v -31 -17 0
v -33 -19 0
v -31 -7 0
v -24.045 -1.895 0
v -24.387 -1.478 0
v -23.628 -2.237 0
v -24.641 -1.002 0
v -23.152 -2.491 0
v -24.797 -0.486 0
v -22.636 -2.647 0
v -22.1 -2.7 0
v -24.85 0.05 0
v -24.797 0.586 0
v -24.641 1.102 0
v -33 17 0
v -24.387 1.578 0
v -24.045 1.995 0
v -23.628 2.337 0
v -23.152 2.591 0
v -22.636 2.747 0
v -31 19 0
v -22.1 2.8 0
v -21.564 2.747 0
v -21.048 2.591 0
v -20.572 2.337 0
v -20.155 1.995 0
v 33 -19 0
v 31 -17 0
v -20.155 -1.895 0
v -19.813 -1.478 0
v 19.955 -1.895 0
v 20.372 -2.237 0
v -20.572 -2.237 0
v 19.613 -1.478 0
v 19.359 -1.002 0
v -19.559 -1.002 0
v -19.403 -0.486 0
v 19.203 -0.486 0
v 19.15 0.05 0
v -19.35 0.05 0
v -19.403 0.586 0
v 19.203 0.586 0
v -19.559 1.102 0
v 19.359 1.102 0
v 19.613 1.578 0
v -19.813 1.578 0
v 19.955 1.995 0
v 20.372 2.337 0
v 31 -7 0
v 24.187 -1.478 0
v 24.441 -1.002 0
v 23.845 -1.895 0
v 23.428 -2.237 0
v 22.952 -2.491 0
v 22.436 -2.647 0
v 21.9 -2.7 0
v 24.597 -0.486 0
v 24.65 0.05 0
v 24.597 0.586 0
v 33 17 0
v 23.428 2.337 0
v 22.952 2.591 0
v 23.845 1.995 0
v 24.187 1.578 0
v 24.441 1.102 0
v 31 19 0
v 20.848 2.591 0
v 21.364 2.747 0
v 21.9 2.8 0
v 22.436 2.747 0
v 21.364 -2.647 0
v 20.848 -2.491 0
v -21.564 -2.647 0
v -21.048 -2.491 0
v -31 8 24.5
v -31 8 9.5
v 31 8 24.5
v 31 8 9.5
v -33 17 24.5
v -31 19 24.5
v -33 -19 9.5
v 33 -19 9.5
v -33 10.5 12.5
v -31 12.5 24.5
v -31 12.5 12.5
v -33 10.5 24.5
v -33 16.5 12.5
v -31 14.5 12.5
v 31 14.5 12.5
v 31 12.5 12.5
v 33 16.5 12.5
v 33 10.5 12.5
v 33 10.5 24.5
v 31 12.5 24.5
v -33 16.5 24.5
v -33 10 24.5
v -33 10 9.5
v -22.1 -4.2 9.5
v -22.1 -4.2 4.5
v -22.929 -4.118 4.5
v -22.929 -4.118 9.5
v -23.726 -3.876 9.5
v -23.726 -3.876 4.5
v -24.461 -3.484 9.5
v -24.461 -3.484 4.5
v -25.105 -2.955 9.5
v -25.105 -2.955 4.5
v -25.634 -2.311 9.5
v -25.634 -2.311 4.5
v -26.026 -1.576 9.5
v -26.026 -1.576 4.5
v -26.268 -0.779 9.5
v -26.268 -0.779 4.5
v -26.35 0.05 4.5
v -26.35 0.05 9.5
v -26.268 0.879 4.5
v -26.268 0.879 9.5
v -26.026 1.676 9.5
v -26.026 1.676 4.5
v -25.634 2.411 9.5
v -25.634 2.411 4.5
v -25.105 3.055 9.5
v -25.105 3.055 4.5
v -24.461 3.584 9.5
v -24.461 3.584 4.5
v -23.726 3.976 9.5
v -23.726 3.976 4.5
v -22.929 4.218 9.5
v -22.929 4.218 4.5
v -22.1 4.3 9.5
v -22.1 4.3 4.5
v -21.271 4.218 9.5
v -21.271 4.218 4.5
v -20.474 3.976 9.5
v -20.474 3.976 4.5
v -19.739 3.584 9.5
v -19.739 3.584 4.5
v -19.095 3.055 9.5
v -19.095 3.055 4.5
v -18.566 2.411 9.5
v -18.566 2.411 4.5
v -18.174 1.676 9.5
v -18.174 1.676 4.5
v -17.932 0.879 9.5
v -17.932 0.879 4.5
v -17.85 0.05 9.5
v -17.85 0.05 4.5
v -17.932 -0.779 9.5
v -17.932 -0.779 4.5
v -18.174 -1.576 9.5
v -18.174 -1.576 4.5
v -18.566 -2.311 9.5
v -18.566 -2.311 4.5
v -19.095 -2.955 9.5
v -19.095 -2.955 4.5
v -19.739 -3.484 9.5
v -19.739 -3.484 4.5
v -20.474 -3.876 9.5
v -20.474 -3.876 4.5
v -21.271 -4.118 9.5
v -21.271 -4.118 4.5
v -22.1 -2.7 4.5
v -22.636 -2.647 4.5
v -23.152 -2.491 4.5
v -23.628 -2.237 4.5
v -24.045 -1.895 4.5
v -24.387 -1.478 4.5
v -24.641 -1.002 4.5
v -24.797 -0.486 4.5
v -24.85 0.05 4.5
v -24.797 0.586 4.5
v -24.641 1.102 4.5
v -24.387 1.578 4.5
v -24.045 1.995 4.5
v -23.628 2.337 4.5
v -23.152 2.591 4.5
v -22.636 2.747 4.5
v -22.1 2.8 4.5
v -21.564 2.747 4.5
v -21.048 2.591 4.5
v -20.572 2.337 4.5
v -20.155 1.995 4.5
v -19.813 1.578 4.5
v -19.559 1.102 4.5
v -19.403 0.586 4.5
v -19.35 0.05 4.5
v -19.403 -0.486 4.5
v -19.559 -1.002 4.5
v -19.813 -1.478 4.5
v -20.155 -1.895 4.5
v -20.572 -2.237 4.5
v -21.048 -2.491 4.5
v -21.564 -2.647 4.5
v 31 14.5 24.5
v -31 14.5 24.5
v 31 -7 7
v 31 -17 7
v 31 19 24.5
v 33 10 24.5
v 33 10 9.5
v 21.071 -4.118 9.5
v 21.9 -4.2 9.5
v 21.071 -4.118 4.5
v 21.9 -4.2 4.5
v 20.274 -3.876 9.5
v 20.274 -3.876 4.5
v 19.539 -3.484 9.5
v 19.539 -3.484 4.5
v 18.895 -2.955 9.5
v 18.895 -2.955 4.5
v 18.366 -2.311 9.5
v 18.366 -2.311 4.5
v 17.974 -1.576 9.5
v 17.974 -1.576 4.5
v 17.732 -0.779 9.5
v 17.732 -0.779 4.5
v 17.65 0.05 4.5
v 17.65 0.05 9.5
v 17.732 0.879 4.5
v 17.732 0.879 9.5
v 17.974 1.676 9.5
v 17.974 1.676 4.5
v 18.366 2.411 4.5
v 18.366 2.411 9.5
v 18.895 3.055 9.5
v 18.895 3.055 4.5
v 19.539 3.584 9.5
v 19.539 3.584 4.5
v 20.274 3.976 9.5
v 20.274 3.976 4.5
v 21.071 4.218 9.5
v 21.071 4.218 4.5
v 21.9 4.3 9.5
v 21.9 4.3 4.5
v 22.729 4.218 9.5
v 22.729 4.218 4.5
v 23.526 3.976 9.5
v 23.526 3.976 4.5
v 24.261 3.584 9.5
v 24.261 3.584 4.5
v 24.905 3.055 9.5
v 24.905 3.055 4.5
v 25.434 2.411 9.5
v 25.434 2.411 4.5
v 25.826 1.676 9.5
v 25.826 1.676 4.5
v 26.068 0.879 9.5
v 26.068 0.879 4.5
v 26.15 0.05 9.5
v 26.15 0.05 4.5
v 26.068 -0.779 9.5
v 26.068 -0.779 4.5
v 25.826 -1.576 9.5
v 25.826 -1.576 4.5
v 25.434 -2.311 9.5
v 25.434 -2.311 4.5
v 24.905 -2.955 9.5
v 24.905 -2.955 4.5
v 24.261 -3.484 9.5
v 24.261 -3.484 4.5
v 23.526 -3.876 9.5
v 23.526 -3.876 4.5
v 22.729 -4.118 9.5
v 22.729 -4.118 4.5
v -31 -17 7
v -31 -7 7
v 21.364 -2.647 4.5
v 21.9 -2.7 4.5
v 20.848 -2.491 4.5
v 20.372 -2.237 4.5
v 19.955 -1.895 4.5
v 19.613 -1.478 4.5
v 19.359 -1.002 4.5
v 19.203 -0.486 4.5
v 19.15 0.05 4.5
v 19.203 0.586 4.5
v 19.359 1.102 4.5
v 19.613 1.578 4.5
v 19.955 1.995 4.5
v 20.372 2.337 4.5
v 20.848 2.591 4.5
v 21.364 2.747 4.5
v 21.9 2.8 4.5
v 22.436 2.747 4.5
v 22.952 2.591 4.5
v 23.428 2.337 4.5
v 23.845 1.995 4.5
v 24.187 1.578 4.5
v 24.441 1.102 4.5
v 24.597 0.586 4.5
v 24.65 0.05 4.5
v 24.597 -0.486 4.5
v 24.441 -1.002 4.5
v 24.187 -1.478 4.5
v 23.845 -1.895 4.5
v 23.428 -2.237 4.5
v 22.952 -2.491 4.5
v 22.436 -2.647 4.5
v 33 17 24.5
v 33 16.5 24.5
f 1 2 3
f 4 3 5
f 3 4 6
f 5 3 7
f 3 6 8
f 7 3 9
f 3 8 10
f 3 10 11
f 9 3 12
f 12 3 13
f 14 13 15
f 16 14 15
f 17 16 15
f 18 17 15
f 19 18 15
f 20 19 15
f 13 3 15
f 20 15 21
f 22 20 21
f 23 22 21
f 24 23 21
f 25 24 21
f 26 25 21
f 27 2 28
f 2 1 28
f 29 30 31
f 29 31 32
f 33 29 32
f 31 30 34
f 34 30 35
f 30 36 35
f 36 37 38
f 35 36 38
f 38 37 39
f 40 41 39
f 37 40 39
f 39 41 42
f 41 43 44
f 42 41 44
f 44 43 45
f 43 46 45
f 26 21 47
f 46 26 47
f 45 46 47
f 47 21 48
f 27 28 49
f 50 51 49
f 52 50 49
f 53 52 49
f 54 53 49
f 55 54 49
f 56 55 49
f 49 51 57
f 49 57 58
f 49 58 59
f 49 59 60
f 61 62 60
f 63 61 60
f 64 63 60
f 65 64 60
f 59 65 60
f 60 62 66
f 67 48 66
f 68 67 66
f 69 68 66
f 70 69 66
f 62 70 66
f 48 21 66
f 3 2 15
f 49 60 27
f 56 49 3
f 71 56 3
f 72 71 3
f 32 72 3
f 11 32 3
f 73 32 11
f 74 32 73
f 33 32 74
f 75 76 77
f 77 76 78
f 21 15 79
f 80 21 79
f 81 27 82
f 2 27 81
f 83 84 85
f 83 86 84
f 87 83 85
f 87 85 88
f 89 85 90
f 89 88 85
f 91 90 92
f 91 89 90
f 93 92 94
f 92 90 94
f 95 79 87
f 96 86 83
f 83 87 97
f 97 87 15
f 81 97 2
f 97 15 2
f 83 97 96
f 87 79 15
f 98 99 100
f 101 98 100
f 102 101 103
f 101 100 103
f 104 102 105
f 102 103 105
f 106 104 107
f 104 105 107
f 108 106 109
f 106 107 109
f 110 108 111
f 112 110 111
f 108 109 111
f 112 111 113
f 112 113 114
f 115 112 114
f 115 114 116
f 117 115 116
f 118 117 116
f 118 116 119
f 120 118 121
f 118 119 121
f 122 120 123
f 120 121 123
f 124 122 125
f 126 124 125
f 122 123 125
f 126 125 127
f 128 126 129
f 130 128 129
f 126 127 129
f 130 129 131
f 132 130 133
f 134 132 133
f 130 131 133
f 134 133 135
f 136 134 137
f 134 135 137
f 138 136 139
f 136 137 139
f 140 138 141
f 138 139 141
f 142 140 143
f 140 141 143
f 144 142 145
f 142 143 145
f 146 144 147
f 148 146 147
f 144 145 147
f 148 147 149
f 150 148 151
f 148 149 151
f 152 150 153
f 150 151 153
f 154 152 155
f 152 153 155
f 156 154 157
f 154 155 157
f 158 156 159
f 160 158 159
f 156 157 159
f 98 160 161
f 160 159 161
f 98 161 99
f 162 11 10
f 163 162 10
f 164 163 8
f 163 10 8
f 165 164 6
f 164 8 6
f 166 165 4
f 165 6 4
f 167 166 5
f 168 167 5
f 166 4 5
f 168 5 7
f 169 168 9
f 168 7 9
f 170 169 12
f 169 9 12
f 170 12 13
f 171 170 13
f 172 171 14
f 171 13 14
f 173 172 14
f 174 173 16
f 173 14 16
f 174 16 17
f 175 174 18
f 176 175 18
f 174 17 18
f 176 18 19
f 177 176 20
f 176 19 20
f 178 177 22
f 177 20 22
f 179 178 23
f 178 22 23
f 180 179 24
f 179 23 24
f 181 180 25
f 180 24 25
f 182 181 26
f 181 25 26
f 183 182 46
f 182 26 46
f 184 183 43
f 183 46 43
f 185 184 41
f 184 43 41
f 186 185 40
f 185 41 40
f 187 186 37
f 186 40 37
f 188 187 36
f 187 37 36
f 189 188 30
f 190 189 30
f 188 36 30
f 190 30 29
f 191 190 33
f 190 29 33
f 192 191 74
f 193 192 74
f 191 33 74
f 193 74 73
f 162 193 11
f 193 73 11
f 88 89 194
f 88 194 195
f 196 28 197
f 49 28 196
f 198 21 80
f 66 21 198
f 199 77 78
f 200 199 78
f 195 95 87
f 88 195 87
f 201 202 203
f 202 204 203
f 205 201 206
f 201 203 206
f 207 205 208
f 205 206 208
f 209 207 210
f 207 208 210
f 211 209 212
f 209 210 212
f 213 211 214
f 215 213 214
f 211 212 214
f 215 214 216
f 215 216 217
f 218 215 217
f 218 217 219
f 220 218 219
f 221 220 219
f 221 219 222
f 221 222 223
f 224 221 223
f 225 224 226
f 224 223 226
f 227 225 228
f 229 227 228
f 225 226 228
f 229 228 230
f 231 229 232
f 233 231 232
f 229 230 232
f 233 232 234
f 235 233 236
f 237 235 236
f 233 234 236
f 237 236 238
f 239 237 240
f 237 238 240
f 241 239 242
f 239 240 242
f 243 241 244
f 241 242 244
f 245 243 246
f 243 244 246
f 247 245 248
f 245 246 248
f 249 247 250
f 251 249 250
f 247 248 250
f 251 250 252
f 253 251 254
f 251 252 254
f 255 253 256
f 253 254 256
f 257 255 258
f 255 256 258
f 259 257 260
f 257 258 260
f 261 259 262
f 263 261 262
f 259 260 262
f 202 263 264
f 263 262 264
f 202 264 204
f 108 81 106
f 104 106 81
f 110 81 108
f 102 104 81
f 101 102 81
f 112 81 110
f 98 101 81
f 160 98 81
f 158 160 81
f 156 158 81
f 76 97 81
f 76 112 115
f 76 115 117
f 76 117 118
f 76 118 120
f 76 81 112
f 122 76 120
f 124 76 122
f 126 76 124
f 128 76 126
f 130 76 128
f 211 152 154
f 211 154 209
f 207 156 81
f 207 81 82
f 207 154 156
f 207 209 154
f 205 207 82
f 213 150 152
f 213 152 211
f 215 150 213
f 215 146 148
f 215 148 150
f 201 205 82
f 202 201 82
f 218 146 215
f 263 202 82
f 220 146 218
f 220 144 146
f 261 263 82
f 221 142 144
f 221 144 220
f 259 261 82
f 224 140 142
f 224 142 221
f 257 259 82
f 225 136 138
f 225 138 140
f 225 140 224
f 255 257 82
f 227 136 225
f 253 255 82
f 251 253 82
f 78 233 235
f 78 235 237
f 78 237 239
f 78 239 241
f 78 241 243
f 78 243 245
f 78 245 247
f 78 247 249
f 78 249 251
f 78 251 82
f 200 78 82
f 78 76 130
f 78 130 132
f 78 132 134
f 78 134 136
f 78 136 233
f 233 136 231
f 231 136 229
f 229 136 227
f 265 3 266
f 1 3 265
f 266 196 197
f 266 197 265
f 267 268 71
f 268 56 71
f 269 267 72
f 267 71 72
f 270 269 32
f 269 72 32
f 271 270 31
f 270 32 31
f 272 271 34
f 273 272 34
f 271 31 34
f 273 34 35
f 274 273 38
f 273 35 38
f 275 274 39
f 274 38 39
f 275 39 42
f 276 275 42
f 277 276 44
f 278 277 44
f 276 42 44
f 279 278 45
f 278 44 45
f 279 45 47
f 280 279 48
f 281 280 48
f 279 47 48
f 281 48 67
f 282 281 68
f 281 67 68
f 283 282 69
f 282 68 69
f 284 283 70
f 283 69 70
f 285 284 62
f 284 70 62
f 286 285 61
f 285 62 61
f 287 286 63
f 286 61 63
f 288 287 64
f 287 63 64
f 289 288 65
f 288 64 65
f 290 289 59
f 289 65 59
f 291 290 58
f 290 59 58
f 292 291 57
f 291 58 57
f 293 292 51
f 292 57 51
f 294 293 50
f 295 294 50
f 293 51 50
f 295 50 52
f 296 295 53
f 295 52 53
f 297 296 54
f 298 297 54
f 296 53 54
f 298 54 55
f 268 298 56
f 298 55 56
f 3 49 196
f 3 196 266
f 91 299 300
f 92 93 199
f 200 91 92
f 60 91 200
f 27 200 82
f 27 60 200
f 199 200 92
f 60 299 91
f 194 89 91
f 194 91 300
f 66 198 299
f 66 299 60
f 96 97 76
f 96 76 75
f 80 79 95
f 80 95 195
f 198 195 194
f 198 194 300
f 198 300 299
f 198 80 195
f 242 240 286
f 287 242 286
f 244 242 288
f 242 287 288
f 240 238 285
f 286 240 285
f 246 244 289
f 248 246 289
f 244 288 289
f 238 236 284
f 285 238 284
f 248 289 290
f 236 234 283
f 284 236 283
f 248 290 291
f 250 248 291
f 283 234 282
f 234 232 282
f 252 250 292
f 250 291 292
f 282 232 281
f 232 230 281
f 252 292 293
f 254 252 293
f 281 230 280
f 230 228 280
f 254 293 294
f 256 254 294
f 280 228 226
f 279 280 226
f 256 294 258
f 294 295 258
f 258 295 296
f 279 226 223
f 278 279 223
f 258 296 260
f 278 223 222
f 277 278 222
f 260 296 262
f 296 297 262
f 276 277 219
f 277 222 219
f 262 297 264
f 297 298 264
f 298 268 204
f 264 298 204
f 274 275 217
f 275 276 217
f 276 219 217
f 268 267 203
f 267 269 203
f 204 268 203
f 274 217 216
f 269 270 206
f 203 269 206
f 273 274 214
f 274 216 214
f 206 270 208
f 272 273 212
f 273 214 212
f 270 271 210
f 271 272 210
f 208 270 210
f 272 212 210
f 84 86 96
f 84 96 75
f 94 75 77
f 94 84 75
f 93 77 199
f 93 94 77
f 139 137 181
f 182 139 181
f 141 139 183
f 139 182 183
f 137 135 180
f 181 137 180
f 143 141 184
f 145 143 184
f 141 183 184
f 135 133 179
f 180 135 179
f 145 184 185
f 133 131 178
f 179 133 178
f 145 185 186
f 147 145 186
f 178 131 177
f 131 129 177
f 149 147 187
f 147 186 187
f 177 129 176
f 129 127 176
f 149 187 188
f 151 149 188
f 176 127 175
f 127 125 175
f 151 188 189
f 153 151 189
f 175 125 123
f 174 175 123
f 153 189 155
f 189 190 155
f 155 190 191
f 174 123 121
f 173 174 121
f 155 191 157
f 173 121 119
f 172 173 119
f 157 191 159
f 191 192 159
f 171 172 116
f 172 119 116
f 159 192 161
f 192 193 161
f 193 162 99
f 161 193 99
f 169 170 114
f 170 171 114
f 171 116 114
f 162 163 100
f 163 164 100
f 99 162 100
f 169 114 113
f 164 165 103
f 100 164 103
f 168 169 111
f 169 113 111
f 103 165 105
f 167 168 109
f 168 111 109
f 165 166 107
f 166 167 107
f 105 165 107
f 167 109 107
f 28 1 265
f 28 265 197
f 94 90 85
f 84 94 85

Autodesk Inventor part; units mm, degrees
ref_plane "YZ Plane" through (0, 0, 0) normal (1, 0, 0) x (0, 1, 0)
ref_plane "XZ Plane" through (0, 0, 0) normal (0, 1, 0) x (-1, 0, 0)
ref_plane "XY Plane" through (0, 0, 0) normal (0, 0, 1) x (1, 0, 0)
sketch "Sketch1" plane through (0, 0, 0) normal (0, 0, 1) x (1, 0, 0)
  line L0 (33, -19) -> (-33, -19)
  line L1 (-33, -19) -> (-33, 19)
  line L2 (-33, 19) -> (33, 19)
  line L3 (33, 19) -> (33, -19)
  line L4 (33, -19) -> (-33, 19) construction
  line L5 (-33, -19) -> (33, 19) construction
  point P0 (0, 0)
  dimension "d0" = 66
  dimension "d1" = 38
extrude "Extrusion1" add sketch "Sketch1" along normal blind 9.5
sketch "Sketch2" plane through (0, 0, 0) normal (0, 0, -1) x (-1, 0, 0)
  line L0 (-31, -7) -> (31, -7)
  line L1 (31, -7) -> (31, -17)
  line L2 (31, -17) -> (-31, -17)
  line L3 (-31, -17) -> (-31, -7)
  line L4 (33, 19) -> (33, -19) projected
  line L5 (-33, -19) -> (-33, 19) construction
  line L6 (33, 19) -> (33, -19) construction
  line L7 (33, -19) -> (-33, -19) construction
  point P0 (0, 0)
  point P1 (0, -7)
  dimension "d4" = 2
  dimension "d5" = 2
  dimension "d6" = 12
extrude "Extrusion2" cut sketch "Sketch2" against normal blind 7
sketch "Sketch3" plane through (0, 0, 9.5) normal (0, 0, 1) x (1, 0, 0)
  line L0 (33, -19) -> (33, 19) projected
  line L1 (-33, 19) -> (33, 19) construction
  line L2 (33, 19) -> (33, 8) construction
  line L3 (33, 8) -> (-33, 8) construction
  line L4 (-33, 8) -> (-33, 19) construction
  line L5 (-33, -19) -> (33, -19) projected
  line L6 (-33, 8) -> (33, 8)
  line L7 (33, 8) -> (33, 12.5)
  line L8 (33, 12.5) -> (-33, 12.5)
  line L9 (-33, 12.5) -> (-33, 8)
  line L10 (33, 19) -> (-33, 19) projected
  line L11 (-33, 19) -> (33, 19)
  line L12 (33, 19) -> (33, 14.5)
  line L13 (33, 14.5) -> (-33, 14.5)
  line L14 (-33, 14.5) -> (-33, 19)
  point P0 (0, 0)
  dimension "d9" = 27
  dimension "d10" = 2
  dimension "d11" = 4.5
extrude "Extrusion3" add sketch "Sketch3" along normal blind 15
sketch "Sketch4" plane through (0, 0, 9.5) normal (0, 0, 1) x (1, 0, 0)
  line L0 (-33, 14.5) -> (-33, 12.5) projected
  line L1 (-33, 12.5) -> (33, 12.5) projected
  line L2 (-33, 14.5) -> (33, 14.5)
  line L3 (33, 14.5) -> (33, 12.5)
  line L4 (33, 12.5) -> (-33, 12.5)
  line L5 (-33, 12.5) -> (-33, 14.5)
  point P0 (0, 0)
extrude "Extrusion4" add sketch "Sketch4" along normal blind 3
chamfer "Chamfer1" distance 2 angle 45 8 edges at (33, 12.5, 18.5) (33, 8, 17) (-33, 12.5, 18.5) (-33, 8, 17) (-33, 19, 12.25) (-33, 14.5, 18.5) (33, 14.5, 18.5) (33, 19, 12.25)
sketch "Sketch5" plane through (0, 0, 9.5) normal (0, 0, 1) x (1, 0, 0)
  circle A0 centre (-22.1, 0.05) radius 5.5
  circle A1 centre (21.9, 0.05) radius 5.5
  line L0 (33, -19) -> (33, 10) projected
  line L1 (-33, -19) -> (33, -19) projected
  point P0 (0, 0)
  dimension "d19" = 11
  dimension "d20" = 11
  dimension "d21" = 44
  dimension "d22" = 11.1
  dimension "d23" = 19.05
hole "Hole1" at (-22.1, 0.05, 9.5) at (21.9, 0.05, 9.5) direction (0, 0, -1) diameter 5.5 end through all counterbore diameter 8.5 counterbore depth 5
equation "\"d11\" = -0.5 * d10 + 0.5 * d1 - 0.5 * d9"
equation "\"d20\" = d19"
properties part number "Floor_support_dammy"
